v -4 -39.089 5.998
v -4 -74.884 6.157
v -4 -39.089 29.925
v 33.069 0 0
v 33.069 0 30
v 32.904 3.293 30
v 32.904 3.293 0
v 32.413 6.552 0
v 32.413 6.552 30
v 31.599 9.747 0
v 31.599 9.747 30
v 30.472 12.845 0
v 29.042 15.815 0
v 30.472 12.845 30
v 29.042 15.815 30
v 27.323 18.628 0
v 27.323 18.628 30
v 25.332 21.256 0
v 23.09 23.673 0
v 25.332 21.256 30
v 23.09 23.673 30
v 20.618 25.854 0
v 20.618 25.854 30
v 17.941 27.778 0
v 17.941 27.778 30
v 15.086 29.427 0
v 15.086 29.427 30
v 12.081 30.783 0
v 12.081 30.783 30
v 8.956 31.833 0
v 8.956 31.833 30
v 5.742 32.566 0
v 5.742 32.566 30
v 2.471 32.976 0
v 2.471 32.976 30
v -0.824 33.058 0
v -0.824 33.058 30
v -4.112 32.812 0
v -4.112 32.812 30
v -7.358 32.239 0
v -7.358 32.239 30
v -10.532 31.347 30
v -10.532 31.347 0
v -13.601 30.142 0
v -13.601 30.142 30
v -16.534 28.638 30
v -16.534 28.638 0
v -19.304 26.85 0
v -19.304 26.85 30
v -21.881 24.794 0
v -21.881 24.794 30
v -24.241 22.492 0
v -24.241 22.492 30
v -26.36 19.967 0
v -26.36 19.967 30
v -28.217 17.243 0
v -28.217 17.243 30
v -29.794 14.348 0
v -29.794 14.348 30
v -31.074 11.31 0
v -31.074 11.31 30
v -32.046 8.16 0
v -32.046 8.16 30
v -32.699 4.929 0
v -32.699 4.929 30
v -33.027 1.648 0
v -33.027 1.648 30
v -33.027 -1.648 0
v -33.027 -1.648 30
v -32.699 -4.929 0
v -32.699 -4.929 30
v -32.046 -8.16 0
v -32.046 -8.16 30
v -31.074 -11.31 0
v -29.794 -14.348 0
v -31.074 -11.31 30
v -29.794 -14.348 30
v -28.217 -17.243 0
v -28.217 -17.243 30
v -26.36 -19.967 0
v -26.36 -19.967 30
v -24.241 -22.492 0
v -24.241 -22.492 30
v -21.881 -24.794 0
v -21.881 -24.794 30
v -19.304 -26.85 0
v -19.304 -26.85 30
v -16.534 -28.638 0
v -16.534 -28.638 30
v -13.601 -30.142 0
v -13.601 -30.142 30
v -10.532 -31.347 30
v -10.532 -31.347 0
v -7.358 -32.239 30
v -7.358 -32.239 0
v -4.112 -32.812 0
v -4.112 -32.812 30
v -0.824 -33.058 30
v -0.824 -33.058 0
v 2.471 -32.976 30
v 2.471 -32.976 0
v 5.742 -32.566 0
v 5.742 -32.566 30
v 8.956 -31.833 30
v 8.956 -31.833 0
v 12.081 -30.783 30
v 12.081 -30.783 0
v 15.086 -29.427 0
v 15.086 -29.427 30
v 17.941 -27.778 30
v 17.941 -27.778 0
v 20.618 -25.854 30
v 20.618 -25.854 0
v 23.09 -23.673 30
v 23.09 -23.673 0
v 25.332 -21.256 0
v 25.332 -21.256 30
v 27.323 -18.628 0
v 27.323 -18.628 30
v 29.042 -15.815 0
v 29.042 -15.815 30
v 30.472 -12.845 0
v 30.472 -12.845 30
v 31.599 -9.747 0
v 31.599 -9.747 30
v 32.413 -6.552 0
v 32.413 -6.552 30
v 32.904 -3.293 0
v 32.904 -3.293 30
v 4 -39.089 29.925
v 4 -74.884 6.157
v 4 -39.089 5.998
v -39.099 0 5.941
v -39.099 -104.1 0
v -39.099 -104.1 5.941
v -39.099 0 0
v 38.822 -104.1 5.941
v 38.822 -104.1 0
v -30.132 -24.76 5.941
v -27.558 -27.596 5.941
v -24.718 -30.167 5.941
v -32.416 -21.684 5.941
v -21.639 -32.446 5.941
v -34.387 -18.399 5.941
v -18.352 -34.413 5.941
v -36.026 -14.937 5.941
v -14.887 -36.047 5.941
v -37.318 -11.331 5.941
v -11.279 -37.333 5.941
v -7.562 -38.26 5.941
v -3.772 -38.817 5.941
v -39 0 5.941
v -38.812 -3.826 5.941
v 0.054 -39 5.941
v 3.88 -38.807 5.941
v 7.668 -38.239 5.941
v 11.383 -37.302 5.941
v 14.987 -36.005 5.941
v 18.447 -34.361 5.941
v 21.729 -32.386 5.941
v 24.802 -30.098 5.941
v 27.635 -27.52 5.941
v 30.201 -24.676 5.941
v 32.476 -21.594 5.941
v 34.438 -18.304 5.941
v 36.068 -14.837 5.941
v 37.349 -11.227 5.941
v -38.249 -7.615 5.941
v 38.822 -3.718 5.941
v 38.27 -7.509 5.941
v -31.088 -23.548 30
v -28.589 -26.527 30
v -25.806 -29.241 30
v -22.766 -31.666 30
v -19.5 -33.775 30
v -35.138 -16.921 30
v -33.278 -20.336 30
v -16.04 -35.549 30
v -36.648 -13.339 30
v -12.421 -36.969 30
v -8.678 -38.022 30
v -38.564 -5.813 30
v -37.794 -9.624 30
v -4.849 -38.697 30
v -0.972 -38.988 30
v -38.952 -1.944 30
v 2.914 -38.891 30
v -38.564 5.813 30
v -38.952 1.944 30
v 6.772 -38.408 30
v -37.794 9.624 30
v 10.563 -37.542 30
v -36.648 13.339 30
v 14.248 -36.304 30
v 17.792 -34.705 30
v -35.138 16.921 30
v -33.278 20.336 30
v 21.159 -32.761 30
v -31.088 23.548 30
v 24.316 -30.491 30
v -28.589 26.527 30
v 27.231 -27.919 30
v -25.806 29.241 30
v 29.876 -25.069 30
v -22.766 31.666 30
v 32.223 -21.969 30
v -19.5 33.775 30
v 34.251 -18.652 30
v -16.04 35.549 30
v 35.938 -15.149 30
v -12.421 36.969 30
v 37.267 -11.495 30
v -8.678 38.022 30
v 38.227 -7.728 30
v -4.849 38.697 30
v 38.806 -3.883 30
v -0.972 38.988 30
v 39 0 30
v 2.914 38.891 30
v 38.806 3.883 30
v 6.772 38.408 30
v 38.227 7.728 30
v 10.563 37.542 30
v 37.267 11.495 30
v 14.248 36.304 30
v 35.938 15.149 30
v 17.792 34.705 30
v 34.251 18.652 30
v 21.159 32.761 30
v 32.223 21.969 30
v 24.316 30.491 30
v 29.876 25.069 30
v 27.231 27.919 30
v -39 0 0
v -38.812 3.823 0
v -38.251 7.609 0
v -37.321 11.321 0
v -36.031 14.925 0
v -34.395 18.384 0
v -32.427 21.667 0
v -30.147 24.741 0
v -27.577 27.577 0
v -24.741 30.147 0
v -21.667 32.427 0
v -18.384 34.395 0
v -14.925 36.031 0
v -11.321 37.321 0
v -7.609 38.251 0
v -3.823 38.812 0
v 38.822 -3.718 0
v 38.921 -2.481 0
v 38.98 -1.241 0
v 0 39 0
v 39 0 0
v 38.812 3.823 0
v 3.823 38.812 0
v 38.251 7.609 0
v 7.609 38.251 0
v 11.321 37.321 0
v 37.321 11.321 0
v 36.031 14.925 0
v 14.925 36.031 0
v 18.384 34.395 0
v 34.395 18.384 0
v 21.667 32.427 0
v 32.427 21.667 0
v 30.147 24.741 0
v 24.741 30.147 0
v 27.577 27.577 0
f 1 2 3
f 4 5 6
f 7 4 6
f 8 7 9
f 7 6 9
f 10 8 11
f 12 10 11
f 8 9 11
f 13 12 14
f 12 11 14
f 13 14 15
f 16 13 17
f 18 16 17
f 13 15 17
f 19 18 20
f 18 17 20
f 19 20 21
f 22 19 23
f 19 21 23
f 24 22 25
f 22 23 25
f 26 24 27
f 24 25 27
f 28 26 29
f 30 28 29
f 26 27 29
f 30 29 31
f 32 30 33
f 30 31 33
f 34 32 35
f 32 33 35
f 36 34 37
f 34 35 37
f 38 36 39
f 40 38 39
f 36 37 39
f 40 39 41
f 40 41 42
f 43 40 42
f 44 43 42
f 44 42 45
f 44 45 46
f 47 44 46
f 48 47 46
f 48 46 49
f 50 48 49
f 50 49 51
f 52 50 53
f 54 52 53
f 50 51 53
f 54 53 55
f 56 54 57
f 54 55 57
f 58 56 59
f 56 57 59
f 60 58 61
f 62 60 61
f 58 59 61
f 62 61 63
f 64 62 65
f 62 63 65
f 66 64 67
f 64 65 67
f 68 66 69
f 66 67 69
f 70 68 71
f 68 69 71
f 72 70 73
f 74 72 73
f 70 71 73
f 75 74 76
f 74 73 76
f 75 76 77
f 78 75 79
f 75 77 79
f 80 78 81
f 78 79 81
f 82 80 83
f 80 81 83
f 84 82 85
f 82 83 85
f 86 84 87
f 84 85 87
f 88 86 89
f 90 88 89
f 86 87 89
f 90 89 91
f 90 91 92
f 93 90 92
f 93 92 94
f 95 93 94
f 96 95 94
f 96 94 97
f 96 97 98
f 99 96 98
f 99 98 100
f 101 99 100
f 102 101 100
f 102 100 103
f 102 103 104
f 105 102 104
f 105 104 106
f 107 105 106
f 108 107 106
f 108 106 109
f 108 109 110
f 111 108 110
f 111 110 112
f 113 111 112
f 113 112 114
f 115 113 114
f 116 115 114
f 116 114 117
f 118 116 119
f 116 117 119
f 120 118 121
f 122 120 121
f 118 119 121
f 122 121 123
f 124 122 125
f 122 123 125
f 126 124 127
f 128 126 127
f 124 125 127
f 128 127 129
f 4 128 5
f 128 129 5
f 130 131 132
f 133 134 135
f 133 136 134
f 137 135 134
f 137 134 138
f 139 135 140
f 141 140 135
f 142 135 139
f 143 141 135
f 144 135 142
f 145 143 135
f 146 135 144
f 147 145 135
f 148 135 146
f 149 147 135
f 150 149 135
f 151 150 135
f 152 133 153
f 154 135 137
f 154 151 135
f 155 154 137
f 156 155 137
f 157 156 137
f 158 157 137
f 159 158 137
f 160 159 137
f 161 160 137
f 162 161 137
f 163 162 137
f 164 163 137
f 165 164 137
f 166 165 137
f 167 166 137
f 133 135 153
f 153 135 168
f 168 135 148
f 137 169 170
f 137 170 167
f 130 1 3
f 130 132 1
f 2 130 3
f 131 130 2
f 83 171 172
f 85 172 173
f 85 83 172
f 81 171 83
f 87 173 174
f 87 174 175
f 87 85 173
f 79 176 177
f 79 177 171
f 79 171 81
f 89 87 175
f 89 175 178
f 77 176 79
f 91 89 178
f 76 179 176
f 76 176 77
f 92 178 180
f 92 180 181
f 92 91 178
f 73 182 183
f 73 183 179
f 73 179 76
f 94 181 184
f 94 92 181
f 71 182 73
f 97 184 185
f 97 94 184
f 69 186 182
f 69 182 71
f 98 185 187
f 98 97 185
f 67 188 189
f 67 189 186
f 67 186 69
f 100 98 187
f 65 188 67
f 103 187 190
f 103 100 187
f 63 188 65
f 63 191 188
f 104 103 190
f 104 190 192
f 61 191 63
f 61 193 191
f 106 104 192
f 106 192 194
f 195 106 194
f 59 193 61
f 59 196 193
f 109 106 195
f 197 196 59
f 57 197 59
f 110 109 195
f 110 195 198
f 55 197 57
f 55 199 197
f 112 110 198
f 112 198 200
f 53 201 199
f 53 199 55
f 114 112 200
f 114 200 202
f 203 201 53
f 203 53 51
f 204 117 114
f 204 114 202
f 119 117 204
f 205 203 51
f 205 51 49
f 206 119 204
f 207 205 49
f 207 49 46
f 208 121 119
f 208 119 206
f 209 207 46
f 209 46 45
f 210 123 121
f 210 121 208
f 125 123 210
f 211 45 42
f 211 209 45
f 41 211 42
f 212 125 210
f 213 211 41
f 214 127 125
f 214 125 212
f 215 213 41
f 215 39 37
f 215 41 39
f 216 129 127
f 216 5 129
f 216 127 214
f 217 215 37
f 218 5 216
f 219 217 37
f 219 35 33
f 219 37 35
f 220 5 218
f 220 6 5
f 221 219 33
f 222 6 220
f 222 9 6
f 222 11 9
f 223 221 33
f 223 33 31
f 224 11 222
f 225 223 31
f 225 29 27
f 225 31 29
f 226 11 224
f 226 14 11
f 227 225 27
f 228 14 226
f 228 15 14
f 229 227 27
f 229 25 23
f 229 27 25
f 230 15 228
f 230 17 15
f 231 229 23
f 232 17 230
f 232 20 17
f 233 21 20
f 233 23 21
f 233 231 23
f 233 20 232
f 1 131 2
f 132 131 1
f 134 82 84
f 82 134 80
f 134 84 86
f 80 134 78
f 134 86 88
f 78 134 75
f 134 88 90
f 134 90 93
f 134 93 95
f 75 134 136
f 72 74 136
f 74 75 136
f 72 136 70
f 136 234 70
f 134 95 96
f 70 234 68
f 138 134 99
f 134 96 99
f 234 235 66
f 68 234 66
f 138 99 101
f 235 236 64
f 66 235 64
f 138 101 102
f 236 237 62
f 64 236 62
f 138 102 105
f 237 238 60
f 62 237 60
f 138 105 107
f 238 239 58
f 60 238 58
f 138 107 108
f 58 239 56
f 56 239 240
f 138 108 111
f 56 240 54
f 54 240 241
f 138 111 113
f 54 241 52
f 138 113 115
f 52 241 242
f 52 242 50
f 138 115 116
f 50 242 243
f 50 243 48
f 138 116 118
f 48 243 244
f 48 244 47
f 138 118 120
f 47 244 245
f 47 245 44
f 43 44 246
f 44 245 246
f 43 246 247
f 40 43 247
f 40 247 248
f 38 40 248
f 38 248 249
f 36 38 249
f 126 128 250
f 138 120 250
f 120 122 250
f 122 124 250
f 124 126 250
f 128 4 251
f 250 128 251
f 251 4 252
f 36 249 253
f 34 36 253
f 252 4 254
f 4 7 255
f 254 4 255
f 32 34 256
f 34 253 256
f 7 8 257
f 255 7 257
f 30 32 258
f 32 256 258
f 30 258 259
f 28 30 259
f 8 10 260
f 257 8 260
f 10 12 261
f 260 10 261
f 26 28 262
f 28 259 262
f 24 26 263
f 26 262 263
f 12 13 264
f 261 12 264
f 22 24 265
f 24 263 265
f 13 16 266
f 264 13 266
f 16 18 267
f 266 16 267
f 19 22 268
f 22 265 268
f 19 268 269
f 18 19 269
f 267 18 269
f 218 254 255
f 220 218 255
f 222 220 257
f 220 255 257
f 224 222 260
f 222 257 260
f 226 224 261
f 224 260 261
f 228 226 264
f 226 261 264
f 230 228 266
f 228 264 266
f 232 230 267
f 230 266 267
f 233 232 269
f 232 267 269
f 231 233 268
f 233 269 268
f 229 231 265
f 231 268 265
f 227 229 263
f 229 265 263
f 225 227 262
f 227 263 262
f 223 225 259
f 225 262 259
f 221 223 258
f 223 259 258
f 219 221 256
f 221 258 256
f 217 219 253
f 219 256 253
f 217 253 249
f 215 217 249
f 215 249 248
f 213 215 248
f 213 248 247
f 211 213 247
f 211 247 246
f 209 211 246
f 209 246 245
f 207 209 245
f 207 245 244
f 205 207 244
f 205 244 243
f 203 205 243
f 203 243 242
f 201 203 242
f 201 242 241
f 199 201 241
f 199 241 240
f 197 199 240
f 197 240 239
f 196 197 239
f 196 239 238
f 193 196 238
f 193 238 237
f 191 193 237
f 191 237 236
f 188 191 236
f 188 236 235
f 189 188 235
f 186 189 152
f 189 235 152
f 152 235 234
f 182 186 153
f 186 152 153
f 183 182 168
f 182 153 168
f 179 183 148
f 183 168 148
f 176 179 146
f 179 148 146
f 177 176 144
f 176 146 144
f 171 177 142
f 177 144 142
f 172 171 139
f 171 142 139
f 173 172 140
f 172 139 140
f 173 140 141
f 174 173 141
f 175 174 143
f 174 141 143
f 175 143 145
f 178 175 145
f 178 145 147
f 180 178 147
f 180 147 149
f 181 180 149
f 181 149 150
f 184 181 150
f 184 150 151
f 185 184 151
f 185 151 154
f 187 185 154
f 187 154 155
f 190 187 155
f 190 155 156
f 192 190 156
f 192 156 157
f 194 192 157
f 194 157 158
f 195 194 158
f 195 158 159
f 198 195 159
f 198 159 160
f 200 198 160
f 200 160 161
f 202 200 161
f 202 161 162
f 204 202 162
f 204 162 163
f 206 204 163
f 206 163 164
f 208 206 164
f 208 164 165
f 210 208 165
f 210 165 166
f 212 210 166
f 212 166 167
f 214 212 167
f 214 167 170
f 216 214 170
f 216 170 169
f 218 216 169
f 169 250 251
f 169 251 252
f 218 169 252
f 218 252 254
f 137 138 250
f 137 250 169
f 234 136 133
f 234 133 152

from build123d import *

# Parameters (mm, degrees)
F0_R     = 39
F1_DEPTH = 30
F2_W     = 77.9210589826
F2_H     = 5.9407898225
F3_DEPTH = 74.5
F4_R     = 33.0685483586
F5_DEPTH = 30
F7_DEPTH = 4
F8_W     = 77.9210589826
F8_H     = 5.9407898225
F9_DEPTH = 29.6


with BuildPart() as f1:
    # F0 (on Top) → F1 (new body)
    with BuildSketch(Plane.XY):
        Circle(F0_R)
    extrude(amount=F1_DEPTH)

    # F2 (on Front) → F3 (join)
    with BuildSketch(Plane.XZ):
        with Locations((-0.1381579787, 2.9703949112)):
            Rectangle(F2_W, F2_H)
    extrude(amount=F3_DEPTH)

    # F4 (on face) → F5 (cut)
    with BuildSketch(Plane.XY.offset(30)):
        Circle(F4_R)
    extrude(amount=-F5_DEPTH, mode=Mode.SUBTRACT)

    # F8 (on face) → F9 (join)
    with BuildSketch(Plane.XZ.offset(74.5)):
        with Locations((-0.1381579787, 2.9703949112)):
            Rectangle(F8_W, F8_H)
    extrude(amount=F9_DEPTH)


with BuildPart() as f7:
    # F6 (on Right) → F7 (new body, symmetric)
    with BuildSketch(Plane.YZ):
        Polygon((-39.0886366367, 29.9249999225), (-74.8840942979, 6.1568184756), (-39.0886366367, 5.9980223887), align=None)
    extrude(amount=F7_DEPTH, both=True)


solid = Compound([f1.part, f7.part])
